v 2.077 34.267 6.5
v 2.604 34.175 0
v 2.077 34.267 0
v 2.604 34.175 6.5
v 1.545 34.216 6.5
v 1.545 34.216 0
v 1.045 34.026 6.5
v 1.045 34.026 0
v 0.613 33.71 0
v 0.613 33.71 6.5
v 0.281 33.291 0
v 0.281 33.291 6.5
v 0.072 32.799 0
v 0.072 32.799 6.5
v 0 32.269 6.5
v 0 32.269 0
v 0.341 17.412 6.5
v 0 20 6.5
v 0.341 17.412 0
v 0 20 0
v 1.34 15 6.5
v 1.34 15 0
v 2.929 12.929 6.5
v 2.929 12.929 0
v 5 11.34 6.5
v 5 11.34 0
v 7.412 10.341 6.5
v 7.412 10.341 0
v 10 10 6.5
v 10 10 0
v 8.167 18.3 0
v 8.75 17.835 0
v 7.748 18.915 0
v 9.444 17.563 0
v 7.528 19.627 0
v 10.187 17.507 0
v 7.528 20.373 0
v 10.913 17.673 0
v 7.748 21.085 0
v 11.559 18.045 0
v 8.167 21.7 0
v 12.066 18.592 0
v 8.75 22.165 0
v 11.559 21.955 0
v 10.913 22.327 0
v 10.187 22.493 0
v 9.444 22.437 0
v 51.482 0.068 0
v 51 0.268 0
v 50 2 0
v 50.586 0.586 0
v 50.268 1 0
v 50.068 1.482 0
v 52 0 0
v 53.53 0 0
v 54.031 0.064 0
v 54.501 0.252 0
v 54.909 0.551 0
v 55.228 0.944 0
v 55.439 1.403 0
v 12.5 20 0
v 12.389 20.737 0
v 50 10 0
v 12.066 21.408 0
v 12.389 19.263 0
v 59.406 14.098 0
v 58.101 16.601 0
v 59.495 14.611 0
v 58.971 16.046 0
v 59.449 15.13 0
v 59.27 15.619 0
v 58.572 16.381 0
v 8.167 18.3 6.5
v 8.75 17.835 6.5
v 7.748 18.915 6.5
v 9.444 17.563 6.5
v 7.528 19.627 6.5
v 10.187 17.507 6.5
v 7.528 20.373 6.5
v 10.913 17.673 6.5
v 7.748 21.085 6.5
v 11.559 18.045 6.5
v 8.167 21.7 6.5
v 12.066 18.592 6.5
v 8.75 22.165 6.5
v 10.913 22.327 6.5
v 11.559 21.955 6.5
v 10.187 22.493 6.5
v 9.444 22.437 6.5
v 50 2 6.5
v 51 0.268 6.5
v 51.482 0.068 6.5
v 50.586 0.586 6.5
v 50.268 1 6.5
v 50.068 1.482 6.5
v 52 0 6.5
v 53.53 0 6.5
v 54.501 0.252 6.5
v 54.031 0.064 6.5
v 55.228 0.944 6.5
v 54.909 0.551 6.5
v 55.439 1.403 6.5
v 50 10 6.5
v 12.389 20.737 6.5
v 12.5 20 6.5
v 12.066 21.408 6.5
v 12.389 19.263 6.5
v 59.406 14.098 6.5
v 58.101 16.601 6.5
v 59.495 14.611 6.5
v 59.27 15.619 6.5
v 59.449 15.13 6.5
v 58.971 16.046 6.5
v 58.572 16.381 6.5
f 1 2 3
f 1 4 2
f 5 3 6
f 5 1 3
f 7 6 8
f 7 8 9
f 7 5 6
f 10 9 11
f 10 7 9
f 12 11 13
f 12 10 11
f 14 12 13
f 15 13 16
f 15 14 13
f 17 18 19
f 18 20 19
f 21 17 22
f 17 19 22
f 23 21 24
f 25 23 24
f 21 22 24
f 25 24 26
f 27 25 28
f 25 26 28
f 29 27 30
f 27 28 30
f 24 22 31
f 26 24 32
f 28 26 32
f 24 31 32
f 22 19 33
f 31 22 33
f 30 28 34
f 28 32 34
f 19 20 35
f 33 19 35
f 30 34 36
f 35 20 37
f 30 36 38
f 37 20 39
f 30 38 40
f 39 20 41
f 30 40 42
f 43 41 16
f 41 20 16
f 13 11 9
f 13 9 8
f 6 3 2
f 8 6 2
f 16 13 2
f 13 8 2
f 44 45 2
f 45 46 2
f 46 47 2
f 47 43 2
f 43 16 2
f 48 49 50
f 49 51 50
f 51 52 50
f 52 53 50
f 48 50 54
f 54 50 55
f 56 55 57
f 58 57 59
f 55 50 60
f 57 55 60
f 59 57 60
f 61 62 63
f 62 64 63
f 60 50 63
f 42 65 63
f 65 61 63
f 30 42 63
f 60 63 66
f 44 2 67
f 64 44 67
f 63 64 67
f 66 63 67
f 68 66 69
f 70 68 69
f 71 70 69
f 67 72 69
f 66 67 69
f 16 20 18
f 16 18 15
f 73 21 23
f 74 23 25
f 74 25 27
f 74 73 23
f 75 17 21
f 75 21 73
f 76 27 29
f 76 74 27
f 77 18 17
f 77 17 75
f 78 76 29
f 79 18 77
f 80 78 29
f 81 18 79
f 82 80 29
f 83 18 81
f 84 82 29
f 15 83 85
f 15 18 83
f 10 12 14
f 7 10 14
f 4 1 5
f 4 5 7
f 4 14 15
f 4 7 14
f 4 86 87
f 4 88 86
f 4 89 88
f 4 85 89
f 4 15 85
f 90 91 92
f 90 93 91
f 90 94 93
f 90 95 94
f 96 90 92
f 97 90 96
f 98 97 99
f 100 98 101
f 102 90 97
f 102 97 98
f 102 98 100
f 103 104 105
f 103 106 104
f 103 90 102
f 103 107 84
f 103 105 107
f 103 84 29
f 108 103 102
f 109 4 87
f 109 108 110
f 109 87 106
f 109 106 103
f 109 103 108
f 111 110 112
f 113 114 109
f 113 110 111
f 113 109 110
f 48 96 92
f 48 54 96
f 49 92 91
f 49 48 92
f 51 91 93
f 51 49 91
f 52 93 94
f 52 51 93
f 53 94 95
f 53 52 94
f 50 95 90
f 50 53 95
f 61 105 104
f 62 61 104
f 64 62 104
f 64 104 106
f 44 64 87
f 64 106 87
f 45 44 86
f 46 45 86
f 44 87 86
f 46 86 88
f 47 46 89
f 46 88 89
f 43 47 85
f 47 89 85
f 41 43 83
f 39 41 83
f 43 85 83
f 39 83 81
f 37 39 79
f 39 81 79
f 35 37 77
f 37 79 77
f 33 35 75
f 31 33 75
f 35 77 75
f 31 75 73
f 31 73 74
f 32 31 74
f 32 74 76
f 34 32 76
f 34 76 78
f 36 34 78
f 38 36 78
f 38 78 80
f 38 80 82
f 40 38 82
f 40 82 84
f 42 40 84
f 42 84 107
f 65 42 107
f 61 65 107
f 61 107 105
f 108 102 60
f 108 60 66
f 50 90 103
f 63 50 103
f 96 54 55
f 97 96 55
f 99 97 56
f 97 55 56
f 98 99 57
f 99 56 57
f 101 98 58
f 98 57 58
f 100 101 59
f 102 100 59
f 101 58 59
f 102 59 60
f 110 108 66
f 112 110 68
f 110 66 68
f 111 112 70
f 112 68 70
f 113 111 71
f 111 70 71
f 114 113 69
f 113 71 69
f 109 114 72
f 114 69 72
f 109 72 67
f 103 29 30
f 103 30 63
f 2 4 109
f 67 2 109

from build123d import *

# Parameters (mm, degrees)
SKETCH1_W           = 60
SKETCH1_H           = 35
BOSS_EXTRUDE1_DEPTH = 6.5
SKETCH2_W           = 50
SKETCH2_H           = 10
CUT_EXTRUDE1_DEPTH  = 70.765679241
FILLET1_R           = 10
CUT_EXTRUDE2_REACH  = 71.766
SKETCH3_R           = 2.5
CUT_EXTRUDE3_DEPTH  = 70.765679241
CUT_EXTRUDE4_DEPTH  = 70.765679241
FILLET6_R           = 2
FILLET7_R           = 2
FILLET8_R           = 2
FILLET9_R           = 2


with BuildPart() as part:
    # Sketch1 → Boss-Extrude1 (new body)
    with BuildSketch(Plane.XY):
        with Locations((30, 17.5)):
            Rectangle(SKETCH1_W, SKETCH1_H)
    extrude(amount=BOSS_EXTRUDE1_DEPTH)

    # Sketch2 → Cut-Extrude1 (cut, through all)
    with BuildSketch(Plane.XY.offset(6.5)):
        with Locations((25, 5)):
            Rectangle(SKETCH2_W, SKETCH2_H)
    extrude(amount=-CUT_EXTRUDE1_DEPTH, mode=Mode.SUBTRACT)

    # Fillet1
    fillet1_edges = [part.edges().sort_by_distance(p)[0] for p in [
        (0, 10, 3.25),
    ]]
    fillet(fillet1_edges, radius=FILLET1_R)

    # Sketch3 → Cut-Extrude2 (cut, up to next)
    with BuildSketch(Plane.XY.offset(6.5), mode=Mode.PRIVATE) as cut_extrude2_sk1:
        with Locations((10, 20)):
            Circle(SKETCH3_R)
    cut_extrude2_tool1 = extrude(cut_extrude2_sk1.sketch, amount=-CUT_EXTRUDE2_REACH, mode=Mode.PRIVATE) & part.part
    add(cut_extrude2_tool1.solids().sort_by_distance((10, 20, 6.5))[0], mode=Mode.SUBTRACT)

    # Sketch4 → Cut-Extrude3 (cut, through all)
    with BuildSketch(Plane.XY.offset(6.5)):
        Polygon((55, 0), (60, 16), (60, 0), align=None)
    extrude(amount=-CUT_EXTRUDE3_DEPTH, mode=Mode.SUBTRACT)

    # Sketch5 → Cut-Extrude4 (cut, through all)
    with BuildSketch(Plane.XY.offset(6.5)):
        Polygon((0, 35), (60, 16), (60, 35), align=None)
    extrude(amount=-CUT_EXTRUDE4_DEPTH, mode=Mode.SUBTRACT)

    # Fillet6
    fillet6_edges = [part.edges().sort_by_distance(p)[0] for p in [
        (50, 0, 3.25),
    ]]
    fillet(fillet6_edges, radius=FILLET6_R)

    # Fillet7
    fillet7_edges = [part.edges().sort_by_distance(p)[0] for p in [
        (55, 0, 3.25),
    ]]
    fillet(fillet7_edges, radius=FILLET7_R)

    # Fillet8
    fillet8_edges = [part.edges().sort_by_distance(p)[0] for p in [
        (60, 16, 3.25),
    ]]
    fillet(fillet8_edges, radius=FILLET8_R)

    # Fillet9
    fillet9_edges = [part.edges().sort_by_distance(p)[0] for p in [
        (0, 35, 3.25),
    ]]
    fillet(fillet9_edges, radius=FILLET9_R)


solid = part.part
